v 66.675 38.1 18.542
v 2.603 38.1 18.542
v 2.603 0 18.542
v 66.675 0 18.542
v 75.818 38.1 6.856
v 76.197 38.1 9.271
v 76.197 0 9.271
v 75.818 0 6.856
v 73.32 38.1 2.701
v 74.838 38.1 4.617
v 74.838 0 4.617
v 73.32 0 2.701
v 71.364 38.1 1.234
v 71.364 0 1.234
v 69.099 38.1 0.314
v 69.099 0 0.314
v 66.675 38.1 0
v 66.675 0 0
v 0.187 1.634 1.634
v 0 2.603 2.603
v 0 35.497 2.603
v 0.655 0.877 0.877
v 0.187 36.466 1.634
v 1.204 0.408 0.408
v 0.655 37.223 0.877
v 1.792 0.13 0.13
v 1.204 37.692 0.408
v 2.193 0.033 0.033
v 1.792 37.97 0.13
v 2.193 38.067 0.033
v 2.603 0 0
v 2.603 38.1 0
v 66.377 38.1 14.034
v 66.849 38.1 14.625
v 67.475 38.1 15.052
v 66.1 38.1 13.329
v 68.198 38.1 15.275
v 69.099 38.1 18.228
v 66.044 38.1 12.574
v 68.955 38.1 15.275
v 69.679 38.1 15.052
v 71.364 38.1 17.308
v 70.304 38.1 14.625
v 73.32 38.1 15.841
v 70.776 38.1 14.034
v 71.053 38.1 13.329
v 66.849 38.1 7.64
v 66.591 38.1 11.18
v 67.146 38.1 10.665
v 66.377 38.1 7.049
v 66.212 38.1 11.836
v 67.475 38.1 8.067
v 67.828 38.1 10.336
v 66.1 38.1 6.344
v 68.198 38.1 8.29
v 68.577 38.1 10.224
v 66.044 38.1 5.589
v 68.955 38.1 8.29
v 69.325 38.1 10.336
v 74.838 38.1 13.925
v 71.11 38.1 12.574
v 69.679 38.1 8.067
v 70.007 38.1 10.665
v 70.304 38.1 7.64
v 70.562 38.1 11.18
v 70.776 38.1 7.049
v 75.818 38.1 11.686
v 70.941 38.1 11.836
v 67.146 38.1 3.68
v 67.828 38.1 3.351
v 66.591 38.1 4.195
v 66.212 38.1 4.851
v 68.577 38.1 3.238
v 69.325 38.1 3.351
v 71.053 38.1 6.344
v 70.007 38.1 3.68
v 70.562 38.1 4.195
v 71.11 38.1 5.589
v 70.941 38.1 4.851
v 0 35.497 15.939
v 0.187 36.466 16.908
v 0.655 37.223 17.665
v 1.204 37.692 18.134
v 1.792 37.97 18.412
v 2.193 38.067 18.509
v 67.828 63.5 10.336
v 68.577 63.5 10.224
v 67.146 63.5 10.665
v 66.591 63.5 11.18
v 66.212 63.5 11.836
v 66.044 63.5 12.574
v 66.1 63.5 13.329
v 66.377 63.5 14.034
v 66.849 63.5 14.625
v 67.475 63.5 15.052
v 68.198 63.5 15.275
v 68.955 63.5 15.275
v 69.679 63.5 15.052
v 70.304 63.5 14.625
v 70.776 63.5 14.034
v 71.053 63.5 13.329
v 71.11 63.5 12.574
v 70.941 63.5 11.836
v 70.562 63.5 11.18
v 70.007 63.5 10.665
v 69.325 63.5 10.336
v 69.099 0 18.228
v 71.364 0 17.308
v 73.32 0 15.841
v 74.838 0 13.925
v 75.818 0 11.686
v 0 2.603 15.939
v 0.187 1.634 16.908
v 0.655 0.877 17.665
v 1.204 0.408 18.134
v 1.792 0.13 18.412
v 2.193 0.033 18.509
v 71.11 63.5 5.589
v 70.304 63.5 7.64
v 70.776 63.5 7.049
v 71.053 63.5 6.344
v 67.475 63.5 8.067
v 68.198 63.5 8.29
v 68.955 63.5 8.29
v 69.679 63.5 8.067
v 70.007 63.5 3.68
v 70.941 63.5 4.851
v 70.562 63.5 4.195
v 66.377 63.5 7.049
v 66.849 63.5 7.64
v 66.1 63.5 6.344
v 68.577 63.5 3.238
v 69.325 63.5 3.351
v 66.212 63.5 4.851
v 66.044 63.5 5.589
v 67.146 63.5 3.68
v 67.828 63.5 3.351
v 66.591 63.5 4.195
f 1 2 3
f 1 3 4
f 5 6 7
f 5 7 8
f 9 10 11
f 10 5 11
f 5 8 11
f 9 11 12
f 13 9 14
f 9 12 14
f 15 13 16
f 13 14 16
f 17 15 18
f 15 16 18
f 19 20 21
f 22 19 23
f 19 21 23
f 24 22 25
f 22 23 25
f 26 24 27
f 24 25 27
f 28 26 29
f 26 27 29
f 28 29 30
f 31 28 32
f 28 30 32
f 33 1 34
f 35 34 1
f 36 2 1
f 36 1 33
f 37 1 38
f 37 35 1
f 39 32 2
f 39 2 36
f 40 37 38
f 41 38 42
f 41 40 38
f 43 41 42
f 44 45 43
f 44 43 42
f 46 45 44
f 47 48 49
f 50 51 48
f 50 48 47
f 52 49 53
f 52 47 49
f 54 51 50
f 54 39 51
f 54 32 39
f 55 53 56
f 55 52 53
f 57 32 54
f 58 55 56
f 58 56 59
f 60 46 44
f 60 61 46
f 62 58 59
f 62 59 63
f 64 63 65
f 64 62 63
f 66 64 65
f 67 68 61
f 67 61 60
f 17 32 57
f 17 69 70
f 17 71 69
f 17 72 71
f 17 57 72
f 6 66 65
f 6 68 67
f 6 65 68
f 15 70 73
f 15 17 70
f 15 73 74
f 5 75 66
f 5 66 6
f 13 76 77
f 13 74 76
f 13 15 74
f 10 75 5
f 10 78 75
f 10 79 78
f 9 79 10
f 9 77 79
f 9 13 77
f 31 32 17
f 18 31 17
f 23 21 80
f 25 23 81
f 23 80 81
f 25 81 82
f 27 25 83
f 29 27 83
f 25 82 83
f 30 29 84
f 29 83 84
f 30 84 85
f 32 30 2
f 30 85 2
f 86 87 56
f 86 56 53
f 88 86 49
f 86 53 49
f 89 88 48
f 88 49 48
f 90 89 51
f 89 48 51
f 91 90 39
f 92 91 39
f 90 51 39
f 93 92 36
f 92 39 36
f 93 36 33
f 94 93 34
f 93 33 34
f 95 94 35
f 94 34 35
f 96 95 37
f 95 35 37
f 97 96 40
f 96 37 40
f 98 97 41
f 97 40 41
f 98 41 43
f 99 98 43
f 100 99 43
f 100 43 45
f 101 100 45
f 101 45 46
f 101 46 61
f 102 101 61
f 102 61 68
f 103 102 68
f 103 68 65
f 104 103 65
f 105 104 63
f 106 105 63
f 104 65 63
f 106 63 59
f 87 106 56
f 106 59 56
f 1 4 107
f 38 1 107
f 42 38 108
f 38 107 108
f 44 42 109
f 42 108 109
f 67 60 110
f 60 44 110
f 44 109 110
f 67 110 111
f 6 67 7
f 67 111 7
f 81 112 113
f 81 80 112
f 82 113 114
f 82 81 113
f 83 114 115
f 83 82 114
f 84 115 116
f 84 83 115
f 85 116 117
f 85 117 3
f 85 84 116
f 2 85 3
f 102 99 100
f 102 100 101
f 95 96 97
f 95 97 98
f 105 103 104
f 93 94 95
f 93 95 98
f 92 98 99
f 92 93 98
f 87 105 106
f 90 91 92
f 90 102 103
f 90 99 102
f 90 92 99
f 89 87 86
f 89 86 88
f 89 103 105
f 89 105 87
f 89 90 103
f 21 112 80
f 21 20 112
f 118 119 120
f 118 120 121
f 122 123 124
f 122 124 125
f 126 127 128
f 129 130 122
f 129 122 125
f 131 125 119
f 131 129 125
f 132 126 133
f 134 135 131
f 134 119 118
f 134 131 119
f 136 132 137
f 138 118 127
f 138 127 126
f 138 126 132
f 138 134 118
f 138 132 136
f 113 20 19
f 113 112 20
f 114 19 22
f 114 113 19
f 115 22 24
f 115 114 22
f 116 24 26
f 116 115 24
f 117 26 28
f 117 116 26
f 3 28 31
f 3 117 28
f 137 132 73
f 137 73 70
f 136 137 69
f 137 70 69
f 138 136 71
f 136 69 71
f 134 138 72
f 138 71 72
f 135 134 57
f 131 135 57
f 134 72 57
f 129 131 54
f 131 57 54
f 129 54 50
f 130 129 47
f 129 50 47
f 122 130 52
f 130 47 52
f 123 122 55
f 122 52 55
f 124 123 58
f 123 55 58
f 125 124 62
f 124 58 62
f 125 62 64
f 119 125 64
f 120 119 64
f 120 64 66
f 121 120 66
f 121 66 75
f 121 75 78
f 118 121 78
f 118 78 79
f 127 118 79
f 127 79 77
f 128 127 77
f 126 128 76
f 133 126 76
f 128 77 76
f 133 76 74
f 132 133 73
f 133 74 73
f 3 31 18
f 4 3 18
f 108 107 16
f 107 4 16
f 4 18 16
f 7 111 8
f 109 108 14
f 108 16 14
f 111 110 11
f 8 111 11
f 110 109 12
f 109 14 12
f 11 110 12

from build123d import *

# Parameters (mm, degrees)
SKETCH1_W           = 76.2
SKETCH1_H           = 38.1
BOSS_EXTRUDE1_DEPTH = 18.542
FILLET1_R           = 9.525
SKETCH2_R           = 2.54
BOSS_EXTRUDE2_DEPTH = 25.4
FILLET2_R           = 2.6035


with BuildPart() as part:
    # Sketch1 → Boss-Extrude1 (new body)
    with BuildSketch(Plane.XY):
        with Locations((38.1, 19.05)):
            Rectangle(SKETCH1_W, SKETCH1_H)
    extrude(amount=BOSS_EXTRUDE1_DEPTH)

    # Fillet1
    # the kernel refuses this fillet: 9.525 mm, written as the material it takes off along each edge
    with BuildSketch(Plane(origin=(76.2, -23.8125, 18.542), x_dir=(0, 0, -1), z_dir=(0, 1, 0))) as fillet1_piece_1:
        with BuildLine():
            CenterArc((FILLET1_R, FILLET1_R), FILLET1_R, 180, 90)
            Line((0, FILLET1_R), (0, 0))
            Line((0, 0), (FILLET1_R, 0))
        make_face()
    extrude(amount=85.725, mode=Mode.SUBTRACT)
    with BuildSketch(Plane(origin=(76.2, -23.8125, 0), x_dir=(0, 0, 1), z_dir=(0, 1, 0))) as fillet1_piece_2:
        with BuildLine():
            CenterArc((FILLET1_R, -FILLET1_R), FILLET1_R, 90, 90)
            Line((0, -FILLET1_R), (0, 0))
            Line((0, 0), (FILLET1_R, 0))
        make_face()
    extrude(amount=85.725, mode=Mode.SUBTRACT)

    # Sketch2 → Boss-Extrude2 (add)
    with BuildSketch(Plane(origin=(0, 38.1, 0), x_dir=(1, 0, 0), z_dir=(0, 1, 0))):
        with Locations(Location((68.576612731, -5.7785, 0), (0, 0, 90))):
            Circle(SKETCH2_R)
        with Locations(Location((68.576612731, -12.7635, 0), (0, 0, 90))):
            Circle(SKETCH2_R)
    extrude(amount=BOSS_EXTRUDE2_DEPTH)

    # Fillet2
    fillet2_edges = [part.edges().sort_by_distance(p)[0] for p in [
        (0, 19.05, 18.542),
        (0, 19.05, 0),
        (0, 38.1, 9.271),
        (0, 0, 9.271),
    ]]
    fillet(fillet2_edges, radius=FILLET2_R)


solid = part.part
